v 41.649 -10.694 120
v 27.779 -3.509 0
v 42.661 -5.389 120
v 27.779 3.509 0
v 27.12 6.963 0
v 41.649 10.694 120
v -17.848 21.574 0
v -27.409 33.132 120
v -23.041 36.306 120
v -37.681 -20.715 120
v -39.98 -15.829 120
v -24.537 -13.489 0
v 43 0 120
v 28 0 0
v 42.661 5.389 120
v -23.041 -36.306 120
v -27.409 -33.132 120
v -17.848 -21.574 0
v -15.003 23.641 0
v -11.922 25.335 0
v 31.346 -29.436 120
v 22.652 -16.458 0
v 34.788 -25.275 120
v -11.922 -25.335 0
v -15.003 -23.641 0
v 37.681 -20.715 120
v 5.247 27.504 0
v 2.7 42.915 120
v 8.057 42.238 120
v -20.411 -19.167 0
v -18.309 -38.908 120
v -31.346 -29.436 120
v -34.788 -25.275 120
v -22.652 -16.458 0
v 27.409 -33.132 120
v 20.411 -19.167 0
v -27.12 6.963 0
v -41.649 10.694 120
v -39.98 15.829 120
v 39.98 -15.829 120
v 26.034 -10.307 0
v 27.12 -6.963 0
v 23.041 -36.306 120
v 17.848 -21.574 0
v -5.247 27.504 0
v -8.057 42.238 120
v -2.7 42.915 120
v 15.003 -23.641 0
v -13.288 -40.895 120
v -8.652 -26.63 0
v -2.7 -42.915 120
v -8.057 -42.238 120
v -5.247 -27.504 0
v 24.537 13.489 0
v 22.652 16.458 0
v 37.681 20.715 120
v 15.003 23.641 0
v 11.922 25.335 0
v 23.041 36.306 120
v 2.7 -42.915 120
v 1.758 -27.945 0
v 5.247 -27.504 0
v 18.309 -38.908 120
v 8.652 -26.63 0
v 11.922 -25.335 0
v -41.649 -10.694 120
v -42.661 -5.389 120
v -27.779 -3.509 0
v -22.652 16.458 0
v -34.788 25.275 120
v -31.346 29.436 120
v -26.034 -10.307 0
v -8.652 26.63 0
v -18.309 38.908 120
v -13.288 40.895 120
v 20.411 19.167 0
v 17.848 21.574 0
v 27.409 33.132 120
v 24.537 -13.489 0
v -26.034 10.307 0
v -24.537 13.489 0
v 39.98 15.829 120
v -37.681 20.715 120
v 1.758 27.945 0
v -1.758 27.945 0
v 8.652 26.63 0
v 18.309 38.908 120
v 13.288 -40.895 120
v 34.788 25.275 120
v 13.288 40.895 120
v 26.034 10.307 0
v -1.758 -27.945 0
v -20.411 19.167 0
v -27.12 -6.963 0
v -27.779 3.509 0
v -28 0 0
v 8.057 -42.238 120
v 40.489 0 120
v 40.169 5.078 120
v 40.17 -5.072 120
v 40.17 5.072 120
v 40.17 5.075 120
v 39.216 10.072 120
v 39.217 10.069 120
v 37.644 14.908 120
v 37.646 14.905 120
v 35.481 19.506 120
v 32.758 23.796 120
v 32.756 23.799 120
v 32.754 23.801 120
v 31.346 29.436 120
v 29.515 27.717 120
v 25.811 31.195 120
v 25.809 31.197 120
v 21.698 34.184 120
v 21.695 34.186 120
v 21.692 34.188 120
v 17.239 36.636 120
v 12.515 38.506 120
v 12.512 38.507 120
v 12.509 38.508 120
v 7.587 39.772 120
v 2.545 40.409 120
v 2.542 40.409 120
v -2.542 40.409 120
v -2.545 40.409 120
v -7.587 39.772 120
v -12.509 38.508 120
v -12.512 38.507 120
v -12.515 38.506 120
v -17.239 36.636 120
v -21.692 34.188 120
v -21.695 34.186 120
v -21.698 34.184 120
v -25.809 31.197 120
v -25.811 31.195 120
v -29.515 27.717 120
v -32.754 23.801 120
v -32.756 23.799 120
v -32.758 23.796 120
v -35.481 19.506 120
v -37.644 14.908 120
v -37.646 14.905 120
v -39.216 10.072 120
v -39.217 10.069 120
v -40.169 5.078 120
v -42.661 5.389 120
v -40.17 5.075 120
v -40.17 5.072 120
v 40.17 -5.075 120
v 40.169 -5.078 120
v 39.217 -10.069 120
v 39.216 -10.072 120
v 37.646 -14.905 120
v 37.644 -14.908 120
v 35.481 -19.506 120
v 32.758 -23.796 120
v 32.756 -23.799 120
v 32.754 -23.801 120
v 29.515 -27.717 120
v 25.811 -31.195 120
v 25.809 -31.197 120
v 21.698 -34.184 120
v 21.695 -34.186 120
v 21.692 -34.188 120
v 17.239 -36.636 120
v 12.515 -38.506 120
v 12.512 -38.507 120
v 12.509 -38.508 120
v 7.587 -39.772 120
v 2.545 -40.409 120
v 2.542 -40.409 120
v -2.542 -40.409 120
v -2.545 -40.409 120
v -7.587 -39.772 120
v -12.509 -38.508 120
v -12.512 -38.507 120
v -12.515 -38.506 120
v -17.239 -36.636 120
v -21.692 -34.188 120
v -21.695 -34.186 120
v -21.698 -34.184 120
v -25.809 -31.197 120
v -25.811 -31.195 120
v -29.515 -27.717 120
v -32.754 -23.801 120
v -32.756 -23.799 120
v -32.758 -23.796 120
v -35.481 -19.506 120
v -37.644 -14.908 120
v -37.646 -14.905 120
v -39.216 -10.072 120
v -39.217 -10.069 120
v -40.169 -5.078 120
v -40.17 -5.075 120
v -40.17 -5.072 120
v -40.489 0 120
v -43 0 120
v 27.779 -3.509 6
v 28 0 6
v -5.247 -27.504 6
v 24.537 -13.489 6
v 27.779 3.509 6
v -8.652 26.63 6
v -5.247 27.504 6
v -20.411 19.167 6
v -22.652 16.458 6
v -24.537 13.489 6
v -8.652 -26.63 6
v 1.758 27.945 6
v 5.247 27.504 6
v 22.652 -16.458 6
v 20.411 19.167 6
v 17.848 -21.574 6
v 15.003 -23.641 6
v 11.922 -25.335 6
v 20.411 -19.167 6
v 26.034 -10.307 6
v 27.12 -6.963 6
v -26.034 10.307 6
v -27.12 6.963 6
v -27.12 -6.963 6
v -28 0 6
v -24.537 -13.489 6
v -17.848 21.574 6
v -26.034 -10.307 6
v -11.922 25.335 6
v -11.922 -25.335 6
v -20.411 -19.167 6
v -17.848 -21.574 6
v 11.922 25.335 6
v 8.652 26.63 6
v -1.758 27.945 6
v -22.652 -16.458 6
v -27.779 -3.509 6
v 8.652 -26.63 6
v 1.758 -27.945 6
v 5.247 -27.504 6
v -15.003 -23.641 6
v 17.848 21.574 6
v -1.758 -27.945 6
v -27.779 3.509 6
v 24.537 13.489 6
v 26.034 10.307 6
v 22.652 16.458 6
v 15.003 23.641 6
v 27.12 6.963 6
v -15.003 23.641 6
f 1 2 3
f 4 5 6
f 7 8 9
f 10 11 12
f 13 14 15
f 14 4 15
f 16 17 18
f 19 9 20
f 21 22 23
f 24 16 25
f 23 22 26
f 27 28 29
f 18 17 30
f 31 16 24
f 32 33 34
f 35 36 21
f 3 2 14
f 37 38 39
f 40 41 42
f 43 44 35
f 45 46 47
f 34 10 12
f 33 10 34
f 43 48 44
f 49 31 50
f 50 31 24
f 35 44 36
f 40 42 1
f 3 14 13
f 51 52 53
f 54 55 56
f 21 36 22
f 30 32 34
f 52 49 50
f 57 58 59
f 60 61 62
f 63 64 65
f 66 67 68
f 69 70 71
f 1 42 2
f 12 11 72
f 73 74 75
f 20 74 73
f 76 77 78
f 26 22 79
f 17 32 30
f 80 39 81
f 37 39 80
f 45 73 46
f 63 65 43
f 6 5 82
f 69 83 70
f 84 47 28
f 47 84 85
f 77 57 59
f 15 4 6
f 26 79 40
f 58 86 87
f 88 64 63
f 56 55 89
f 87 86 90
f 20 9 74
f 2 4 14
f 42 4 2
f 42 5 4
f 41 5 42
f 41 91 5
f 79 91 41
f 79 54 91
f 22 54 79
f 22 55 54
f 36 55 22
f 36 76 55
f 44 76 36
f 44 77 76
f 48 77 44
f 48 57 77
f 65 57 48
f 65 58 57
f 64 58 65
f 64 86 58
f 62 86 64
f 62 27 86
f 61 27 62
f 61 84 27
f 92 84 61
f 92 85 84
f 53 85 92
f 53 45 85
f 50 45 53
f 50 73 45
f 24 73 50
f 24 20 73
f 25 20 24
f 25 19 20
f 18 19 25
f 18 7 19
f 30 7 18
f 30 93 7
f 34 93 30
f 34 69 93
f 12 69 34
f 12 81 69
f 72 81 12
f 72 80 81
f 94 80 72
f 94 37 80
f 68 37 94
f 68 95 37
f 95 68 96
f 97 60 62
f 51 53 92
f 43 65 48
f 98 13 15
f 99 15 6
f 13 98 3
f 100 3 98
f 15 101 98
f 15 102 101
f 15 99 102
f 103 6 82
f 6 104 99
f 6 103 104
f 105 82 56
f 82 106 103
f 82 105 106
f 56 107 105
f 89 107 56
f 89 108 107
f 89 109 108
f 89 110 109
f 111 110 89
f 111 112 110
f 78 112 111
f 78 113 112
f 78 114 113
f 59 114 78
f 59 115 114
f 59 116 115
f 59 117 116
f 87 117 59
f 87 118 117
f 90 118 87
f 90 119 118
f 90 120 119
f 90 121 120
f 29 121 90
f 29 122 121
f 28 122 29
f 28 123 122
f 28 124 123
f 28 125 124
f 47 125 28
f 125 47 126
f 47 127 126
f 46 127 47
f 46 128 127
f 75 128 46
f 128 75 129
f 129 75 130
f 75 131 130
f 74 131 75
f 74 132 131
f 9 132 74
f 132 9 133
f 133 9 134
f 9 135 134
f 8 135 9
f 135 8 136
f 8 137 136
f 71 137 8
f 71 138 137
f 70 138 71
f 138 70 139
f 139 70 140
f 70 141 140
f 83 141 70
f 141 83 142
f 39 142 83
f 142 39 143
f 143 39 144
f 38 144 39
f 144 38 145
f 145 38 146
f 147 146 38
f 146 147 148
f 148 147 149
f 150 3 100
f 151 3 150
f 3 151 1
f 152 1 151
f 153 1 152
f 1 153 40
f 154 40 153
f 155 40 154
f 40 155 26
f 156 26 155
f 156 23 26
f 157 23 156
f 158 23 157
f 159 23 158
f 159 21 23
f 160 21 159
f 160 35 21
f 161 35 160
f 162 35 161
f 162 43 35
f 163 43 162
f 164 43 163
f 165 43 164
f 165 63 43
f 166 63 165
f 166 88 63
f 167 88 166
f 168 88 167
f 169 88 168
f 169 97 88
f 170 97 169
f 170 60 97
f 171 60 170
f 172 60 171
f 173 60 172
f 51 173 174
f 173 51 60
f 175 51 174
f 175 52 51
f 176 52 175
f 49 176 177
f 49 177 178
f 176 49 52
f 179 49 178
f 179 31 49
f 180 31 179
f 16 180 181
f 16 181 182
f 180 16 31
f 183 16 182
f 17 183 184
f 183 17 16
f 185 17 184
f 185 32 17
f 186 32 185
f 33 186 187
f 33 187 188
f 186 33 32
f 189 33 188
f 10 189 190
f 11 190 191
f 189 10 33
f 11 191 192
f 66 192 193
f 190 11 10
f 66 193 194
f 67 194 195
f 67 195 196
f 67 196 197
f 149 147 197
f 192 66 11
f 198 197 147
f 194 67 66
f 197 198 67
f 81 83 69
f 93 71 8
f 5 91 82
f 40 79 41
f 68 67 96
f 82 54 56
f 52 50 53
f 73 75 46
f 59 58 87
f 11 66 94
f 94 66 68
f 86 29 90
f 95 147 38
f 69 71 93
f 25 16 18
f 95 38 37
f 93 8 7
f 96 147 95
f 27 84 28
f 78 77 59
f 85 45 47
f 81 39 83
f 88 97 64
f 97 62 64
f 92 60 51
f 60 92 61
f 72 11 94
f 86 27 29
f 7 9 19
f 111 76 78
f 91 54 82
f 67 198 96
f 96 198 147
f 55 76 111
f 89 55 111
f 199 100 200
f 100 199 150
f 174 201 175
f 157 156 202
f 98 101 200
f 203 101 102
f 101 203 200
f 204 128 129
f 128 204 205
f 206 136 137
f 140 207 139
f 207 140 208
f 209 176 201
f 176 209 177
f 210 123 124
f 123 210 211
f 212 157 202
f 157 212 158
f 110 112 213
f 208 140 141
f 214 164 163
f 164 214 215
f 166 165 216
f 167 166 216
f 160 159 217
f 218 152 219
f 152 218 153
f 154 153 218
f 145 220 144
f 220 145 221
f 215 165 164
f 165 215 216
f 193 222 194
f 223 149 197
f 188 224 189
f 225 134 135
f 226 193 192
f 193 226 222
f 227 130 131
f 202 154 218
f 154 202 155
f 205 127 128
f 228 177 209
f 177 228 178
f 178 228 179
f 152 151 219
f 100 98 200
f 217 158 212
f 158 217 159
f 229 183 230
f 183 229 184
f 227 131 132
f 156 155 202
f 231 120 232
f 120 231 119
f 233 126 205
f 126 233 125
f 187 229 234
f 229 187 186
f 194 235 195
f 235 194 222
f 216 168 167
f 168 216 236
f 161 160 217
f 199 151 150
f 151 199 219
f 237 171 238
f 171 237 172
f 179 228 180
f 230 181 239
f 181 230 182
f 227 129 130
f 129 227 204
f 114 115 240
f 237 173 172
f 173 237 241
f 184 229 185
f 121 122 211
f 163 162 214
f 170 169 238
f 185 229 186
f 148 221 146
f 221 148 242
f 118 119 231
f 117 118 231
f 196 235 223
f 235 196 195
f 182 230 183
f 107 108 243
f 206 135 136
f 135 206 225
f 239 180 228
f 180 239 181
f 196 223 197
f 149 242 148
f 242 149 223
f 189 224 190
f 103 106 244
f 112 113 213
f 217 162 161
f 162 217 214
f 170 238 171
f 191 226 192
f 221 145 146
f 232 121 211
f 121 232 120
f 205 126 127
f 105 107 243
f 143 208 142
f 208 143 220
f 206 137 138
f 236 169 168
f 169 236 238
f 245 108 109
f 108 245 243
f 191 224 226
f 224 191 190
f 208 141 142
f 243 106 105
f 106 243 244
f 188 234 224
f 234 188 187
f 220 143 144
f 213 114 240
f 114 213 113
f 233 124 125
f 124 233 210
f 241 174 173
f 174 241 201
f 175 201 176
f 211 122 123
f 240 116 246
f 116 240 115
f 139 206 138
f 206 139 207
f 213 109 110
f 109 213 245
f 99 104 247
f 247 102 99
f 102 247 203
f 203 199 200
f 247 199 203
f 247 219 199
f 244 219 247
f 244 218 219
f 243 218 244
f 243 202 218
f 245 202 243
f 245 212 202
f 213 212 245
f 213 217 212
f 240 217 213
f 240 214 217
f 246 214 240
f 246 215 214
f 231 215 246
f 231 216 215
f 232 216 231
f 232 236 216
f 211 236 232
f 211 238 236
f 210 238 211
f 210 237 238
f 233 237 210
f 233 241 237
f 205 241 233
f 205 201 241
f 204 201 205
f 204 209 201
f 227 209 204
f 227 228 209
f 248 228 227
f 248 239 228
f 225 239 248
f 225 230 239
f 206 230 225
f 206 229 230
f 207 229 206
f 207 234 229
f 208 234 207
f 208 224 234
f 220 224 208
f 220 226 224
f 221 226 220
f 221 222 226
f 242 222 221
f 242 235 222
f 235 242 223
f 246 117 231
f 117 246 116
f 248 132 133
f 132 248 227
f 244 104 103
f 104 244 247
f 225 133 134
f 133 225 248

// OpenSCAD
/** IKEA glass, dimensions in millimeters */

eps = 0.1;


// ROS wants meters
// scale( [0.001, 0.001, 0.001] )  
  ikea_glass();


module ikea_glass() {
  difference() {
    cylinder( d1=56, d2=86, h=120, $fn=50, center=false ); 
    translate( [0,0,6] ) // bottom thickness
      cylinder( d1=56, d2=81, h=(120-6+eps), $fn=50, center=false );
  }
}
